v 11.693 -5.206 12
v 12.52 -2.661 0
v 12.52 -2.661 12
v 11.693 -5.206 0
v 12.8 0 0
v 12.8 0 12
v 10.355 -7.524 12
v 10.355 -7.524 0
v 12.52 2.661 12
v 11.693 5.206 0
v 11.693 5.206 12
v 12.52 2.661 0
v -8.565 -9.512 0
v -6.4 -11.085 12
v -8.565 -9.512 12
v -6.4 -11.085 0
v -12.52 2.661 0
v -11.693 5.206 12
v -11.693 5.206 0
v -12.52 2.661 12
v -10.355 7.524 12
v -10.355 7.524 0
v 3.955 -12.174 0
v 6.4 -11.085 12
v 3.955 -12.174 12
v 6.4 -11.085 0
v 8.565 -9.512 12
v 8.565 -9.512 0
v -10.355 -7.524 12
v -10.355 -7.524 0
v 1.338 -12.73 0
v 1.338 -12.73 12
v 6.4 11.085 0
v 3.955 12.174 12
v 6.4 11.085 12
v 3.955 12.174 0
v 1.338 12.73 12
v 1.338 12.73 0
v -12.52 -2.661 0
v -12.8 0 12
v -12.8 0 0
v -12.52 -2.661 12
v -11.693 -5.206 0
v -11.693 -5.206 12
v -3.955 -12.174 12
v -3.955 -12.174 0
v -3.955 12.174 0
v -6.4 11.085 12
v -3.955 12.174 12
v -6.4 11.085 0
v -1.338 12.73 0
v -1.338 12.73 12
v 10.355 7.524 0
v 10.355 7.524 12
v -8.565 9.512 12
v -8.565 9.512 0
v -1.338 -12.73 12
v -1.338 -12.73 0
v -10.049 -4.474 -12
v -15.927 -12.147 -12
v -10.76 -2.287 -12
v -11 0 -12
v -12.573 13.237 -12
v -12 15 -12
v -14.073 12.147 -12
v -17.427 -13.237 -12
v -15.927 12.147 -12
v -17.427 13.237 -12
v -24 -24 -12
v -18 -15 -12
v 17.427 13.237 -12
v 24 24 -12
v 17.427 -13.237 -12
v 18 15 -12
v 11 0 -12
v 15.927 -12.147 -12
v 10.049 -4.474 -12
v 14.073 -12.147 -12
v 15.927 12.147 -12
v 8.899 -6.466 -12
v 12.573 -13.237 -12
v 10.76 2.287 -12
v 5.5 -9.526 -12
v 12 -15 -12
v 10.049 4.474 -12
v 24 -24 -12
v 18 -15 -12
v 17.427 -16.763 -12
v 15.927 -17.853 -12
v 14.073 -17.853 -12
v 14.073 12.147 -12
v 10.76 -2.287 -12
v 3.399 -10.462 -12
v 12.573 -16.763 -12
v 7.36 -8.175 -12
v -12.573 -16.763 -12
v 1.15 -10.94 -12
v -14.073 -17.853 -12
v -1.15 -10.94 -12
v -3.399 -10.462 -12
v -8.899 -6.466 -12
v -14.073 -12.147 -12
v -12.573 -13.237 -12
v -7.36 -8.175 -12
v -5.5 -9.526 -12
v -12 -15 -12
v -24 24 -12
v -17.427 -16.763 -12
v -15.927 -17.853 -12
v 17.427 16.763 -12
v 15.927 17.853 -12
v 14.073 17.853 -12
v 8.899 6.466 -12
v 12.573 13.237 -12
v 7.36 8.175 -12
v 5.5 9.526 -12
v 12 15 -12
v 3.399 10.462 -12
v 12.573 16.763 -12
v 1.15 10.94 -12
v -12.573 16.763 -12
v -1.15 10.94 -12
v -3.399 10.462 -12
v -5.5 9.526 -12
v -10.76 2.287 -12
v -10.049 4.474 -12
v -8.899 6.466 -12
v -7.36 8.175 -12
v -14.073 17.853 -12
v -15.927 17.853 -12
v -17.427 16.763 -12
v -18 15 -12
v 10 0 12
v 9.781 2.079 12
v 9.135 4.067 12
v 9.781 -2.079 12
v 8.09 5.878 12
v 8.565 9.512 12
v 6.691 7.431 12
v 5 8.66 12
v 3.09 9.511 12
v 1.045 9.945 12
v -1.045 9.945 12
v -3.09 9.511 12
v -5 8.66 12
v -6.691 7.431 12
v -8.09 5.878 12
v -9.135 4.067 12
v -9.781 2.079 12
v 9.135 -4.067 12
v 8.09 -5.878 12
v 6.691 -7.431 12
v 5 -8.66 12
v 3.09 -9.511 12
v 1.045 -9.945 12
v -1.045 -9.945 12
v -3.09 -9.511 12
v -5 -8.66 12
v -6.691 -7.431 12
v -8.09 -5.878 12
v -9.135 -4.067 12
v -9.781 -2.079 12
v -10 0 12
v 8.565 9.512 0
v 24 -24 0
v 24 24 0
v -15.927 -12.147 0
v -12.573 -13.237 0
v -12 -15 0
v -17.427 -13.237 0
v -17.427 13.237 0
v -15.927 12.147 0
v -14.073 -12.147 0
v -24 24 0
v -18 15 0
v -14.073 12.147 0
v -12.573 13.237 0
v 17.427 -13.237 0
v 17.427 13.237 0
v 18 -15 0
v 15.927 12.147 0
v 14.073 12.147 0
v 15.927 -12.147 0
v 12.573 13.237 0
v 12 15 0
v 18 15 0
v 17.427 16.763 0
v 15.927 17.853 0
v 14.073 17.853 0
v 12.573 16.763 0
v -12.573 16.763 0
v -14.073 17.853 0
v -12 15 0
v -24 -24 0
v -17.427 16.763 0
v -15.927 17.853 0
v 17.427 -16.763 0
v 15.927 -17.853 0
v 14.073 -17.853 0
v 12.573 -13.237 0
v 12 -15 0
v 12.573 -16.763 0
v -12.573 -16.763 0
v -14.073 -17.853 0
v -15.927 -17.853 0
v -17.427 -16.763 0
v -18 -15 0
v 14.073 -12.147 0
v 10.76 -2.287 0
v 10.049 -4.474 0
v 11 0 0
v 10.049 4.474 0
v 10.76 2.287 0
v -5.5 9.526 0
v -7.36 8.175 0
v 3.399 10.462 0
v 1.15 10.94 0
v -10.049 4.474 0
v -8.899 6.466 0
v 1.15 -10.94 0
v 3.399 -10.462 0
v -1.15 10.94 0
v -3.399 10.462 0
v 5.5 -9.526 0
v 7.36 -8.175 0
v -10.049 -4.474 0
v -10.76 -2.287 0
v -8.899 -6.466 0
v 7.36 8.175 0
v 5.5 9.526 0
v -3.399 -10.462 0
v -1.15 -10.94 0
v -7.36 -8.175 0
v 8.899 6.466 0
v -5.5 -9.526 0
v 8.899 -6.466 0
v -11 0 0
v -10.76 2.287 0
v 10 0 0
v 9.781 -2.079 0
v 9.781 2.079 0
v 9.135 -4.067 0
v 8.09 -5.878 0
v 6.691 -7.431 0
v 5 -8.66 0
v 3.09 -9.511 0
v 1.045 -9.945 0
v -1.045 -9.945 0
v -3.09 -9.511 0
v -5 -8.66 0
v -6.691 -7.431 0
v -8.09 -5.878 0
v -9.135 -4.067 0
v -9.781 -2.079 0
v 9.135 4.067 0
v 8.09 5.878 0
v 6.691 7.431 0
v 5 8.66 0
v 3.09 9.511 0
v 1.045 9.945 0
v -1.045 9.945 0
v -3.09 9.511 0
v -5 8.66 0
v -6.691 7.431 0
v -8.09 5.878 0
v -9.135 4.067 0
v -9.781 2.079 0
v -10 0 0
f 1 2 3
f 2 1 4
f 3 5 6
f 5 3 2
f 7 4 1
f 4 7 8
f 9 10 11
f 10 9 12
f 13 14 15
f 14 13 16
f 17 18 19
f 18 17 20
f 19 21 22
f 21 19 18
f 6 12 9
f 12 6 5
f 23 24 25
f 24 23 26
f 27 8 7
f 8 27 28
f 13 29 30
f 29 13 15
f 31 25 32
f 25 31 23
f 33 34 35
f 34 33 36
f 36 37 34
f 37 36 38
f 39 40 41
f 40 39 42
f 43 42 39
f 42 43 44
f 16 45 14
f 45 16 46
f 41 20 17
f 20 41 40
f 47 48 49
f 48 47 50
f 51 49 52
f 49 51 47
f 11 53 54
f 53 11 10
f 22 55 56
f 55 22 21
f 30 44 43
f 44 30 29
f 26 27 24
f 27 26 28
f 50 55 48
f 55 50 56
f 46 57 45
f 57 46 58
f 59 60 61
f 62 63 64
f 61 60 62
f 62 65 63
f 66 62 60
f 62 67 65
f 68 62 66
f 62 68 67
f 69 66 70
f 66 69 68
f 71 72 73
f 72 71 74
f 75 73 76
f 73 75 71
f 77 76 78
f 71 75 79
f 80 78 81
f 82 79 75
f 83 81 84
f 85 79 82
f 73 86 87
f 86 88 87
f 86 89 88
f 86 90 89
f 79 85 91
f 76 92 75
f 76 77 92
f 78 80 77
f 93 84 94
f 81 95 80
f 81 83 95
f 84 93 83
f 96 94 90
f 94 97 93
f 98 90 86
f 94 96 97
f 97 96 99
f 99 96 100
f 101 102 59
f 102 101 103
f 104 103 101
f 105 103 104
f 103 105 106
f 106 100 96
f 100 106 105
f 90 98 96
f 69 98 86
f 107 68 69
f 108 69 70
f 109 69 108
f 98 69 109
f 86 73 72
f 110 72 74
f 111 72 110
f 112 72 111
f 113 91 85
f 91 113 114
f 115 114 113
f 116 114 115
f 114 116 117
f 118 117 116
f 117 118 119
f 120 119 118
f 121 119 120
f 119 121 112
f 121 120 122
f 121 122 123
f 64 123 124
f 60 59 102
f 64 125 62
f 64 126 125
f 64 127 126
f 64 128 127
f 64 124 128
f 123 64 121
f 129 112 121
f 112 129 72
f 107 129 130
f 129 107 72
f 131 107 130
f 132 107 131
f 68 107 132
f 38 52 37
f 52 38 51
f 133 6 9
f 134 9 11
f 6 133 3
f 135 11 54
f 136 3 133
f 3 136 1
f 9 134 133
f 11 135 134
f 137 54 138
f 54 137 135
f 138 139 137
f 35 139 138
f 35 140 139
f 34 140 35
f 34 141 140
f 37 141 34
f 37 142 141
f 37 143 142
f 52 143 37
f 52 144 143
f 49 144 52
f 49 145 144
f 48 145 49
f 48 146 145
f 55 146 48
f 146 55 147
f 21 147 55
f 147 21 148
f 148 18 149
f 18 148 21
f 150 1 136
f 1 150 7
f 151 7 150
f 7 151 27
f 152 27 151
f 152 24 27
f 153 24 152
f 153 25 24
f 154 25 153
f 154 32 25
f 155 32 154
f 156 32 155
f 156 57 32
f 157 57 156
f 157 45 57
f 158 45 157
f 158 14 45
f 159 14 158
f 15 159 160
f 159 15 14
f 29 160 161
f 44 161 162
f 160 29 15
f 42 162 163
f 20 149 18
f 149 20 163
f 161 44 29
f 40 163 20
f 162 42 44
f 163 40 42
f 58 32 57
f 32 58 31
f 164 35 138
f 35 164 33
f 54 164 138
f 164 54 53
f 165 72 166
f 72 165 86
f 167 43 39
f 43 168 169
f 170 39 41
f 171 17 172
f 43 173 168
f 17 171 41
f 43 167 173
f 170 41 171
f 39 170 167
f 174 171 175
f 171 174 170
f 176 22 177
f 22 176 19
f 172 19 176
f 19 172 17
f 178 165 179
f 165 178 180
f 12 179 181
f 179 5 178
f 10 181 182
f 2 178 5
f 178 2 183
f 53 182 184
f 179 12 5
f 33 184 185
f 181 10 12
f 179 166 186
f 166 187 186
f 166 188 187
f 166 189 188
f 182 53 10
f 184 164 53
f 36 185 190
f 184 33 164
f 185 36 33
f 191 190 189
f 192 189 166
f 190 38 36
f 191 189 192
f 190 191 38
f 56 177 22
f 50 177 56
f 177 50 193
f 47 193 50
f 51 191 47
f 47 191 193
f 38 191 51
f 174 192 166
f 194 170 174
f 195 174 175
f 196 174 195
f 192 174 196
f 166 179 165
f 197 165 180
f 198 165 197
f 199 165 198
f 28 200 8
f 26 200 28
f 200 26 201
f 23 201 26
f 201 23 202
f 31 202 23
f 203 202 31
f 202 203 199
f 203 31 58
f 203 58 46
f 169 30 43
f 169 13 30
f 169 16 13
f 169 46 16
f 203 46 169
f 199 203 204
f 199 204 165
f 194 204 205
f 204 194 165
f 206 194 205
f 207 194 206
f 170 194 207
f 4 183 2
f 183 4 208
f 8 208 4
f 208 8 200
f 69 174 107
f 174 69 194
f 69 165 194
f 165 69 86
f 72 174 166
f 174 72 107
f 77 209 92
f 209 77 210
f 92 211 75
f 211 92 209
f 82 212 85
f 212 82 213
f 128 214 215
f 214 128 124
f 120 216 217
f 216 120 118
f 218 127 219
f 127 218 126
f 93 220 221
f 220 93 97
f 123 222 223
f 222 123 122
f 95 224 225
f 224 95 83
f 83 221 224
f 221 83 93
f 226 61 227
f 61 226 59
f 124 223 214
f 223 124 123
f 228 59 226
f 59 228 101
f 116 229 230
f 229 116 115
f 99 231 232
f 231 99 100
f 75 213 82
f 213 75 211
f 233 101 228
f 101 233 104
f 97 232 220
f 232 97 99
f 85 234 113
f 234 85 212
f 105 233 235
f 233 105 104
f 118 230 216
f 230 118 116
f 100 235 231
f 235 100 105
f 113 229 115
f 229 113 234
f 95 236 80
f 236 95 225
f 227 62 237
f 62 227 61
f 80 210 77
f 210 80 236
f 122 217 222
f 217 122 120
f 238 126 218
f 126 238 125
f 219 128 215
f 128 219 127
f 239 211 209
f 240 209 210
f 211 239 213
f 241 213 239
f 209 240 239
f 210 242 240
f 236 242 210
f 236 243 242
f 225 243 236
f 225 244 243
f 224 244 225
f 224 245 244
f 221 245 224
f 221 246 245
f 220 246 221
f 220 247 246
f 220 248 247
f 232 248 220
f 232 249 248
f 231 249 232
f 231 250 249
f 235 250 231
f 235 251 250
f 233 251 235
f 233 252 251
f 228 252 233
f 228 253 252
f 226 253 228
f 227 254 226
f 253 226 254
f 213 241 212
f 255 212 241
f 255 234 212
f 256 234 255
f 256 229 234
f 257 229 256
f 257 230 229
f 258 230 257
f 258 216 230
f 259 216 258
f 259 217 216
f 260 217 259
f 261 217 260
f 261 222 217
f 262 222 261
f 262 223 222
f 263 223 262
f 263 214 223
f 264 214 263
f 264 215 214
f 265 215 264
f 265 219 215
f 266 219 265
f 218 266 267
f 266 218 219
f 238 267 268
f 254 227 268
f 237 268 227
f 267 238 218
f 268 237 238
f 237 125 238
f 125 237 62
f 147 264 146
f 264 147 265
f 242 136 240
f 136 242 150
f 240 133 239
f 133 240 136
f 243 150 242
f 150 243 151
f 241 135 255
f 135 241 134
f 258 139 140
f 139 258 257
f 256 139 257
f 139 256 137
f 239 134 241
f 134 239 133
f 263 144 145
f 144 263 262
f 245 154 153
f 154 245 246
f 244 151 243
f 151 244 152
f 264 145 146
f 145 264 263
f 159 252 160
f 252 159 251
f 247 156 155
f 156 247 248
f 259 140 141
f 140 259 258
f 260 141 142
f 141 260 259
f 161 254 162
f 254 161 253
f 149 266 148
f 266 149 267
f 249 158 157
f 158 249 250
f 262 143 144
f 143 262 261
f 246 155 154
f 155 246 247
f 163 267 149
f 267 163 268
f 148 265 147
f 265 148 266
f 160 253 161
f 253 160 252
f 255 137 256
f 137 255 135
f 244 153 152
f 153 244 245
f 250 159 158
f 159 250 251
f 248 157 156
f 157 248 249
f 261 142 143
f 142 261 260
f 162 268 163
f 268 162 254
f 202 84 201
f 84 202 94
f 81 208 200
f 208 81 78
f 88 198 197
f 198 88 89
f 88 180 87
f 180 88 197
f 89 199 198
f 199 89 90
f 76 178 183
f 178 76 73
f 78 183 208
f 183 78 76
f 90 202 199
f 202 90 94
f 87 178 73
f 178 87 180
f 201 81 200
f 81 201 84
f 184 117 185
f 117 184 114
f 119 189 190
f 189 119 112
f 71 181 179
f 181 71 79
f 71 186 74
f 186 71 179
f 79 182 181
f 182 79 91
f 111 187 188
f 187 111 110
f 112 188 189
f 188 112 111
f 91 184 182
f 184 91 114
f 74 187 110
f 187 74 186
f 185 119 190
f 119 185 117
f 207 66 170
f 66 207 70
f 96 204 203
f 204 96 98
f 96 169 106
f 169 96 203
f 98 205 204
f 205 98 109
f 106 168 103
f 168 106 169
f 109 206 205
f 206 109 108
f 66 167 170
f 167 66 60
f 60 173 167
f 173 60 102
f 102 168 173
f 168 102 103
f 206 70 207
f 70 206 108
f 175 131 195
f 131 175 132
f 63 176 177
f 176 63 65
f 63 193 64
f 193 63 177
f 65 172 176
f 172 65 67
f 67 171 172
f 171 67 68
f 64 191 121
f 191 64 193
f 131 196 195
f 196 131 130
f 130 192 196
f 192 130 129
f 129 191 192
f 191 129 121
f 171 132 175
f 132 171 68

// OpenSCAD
module part() {
	difference() {
		union() {
			translate([0,0,-12]) cylinder(r=12.8, h=24);
			translate([-24,-24,0]) cube([48,48,12]);
		}
		cylinder(r=11, h=13);
		translate([0,0,-13]) cylinder(r=10, h=14);
		translate([15,15,-13]) cylinder(r=3, h=26);
		translate([15,-15,-13]) cylinder(r=3, h=26);
		translate([-15,15,-13]) cylinder(r=3, h=26);
		translate([-15,-15,-13]) cylinder(r=3, h=26);
	}
}

rotate(180,[1,0,0]) part();
